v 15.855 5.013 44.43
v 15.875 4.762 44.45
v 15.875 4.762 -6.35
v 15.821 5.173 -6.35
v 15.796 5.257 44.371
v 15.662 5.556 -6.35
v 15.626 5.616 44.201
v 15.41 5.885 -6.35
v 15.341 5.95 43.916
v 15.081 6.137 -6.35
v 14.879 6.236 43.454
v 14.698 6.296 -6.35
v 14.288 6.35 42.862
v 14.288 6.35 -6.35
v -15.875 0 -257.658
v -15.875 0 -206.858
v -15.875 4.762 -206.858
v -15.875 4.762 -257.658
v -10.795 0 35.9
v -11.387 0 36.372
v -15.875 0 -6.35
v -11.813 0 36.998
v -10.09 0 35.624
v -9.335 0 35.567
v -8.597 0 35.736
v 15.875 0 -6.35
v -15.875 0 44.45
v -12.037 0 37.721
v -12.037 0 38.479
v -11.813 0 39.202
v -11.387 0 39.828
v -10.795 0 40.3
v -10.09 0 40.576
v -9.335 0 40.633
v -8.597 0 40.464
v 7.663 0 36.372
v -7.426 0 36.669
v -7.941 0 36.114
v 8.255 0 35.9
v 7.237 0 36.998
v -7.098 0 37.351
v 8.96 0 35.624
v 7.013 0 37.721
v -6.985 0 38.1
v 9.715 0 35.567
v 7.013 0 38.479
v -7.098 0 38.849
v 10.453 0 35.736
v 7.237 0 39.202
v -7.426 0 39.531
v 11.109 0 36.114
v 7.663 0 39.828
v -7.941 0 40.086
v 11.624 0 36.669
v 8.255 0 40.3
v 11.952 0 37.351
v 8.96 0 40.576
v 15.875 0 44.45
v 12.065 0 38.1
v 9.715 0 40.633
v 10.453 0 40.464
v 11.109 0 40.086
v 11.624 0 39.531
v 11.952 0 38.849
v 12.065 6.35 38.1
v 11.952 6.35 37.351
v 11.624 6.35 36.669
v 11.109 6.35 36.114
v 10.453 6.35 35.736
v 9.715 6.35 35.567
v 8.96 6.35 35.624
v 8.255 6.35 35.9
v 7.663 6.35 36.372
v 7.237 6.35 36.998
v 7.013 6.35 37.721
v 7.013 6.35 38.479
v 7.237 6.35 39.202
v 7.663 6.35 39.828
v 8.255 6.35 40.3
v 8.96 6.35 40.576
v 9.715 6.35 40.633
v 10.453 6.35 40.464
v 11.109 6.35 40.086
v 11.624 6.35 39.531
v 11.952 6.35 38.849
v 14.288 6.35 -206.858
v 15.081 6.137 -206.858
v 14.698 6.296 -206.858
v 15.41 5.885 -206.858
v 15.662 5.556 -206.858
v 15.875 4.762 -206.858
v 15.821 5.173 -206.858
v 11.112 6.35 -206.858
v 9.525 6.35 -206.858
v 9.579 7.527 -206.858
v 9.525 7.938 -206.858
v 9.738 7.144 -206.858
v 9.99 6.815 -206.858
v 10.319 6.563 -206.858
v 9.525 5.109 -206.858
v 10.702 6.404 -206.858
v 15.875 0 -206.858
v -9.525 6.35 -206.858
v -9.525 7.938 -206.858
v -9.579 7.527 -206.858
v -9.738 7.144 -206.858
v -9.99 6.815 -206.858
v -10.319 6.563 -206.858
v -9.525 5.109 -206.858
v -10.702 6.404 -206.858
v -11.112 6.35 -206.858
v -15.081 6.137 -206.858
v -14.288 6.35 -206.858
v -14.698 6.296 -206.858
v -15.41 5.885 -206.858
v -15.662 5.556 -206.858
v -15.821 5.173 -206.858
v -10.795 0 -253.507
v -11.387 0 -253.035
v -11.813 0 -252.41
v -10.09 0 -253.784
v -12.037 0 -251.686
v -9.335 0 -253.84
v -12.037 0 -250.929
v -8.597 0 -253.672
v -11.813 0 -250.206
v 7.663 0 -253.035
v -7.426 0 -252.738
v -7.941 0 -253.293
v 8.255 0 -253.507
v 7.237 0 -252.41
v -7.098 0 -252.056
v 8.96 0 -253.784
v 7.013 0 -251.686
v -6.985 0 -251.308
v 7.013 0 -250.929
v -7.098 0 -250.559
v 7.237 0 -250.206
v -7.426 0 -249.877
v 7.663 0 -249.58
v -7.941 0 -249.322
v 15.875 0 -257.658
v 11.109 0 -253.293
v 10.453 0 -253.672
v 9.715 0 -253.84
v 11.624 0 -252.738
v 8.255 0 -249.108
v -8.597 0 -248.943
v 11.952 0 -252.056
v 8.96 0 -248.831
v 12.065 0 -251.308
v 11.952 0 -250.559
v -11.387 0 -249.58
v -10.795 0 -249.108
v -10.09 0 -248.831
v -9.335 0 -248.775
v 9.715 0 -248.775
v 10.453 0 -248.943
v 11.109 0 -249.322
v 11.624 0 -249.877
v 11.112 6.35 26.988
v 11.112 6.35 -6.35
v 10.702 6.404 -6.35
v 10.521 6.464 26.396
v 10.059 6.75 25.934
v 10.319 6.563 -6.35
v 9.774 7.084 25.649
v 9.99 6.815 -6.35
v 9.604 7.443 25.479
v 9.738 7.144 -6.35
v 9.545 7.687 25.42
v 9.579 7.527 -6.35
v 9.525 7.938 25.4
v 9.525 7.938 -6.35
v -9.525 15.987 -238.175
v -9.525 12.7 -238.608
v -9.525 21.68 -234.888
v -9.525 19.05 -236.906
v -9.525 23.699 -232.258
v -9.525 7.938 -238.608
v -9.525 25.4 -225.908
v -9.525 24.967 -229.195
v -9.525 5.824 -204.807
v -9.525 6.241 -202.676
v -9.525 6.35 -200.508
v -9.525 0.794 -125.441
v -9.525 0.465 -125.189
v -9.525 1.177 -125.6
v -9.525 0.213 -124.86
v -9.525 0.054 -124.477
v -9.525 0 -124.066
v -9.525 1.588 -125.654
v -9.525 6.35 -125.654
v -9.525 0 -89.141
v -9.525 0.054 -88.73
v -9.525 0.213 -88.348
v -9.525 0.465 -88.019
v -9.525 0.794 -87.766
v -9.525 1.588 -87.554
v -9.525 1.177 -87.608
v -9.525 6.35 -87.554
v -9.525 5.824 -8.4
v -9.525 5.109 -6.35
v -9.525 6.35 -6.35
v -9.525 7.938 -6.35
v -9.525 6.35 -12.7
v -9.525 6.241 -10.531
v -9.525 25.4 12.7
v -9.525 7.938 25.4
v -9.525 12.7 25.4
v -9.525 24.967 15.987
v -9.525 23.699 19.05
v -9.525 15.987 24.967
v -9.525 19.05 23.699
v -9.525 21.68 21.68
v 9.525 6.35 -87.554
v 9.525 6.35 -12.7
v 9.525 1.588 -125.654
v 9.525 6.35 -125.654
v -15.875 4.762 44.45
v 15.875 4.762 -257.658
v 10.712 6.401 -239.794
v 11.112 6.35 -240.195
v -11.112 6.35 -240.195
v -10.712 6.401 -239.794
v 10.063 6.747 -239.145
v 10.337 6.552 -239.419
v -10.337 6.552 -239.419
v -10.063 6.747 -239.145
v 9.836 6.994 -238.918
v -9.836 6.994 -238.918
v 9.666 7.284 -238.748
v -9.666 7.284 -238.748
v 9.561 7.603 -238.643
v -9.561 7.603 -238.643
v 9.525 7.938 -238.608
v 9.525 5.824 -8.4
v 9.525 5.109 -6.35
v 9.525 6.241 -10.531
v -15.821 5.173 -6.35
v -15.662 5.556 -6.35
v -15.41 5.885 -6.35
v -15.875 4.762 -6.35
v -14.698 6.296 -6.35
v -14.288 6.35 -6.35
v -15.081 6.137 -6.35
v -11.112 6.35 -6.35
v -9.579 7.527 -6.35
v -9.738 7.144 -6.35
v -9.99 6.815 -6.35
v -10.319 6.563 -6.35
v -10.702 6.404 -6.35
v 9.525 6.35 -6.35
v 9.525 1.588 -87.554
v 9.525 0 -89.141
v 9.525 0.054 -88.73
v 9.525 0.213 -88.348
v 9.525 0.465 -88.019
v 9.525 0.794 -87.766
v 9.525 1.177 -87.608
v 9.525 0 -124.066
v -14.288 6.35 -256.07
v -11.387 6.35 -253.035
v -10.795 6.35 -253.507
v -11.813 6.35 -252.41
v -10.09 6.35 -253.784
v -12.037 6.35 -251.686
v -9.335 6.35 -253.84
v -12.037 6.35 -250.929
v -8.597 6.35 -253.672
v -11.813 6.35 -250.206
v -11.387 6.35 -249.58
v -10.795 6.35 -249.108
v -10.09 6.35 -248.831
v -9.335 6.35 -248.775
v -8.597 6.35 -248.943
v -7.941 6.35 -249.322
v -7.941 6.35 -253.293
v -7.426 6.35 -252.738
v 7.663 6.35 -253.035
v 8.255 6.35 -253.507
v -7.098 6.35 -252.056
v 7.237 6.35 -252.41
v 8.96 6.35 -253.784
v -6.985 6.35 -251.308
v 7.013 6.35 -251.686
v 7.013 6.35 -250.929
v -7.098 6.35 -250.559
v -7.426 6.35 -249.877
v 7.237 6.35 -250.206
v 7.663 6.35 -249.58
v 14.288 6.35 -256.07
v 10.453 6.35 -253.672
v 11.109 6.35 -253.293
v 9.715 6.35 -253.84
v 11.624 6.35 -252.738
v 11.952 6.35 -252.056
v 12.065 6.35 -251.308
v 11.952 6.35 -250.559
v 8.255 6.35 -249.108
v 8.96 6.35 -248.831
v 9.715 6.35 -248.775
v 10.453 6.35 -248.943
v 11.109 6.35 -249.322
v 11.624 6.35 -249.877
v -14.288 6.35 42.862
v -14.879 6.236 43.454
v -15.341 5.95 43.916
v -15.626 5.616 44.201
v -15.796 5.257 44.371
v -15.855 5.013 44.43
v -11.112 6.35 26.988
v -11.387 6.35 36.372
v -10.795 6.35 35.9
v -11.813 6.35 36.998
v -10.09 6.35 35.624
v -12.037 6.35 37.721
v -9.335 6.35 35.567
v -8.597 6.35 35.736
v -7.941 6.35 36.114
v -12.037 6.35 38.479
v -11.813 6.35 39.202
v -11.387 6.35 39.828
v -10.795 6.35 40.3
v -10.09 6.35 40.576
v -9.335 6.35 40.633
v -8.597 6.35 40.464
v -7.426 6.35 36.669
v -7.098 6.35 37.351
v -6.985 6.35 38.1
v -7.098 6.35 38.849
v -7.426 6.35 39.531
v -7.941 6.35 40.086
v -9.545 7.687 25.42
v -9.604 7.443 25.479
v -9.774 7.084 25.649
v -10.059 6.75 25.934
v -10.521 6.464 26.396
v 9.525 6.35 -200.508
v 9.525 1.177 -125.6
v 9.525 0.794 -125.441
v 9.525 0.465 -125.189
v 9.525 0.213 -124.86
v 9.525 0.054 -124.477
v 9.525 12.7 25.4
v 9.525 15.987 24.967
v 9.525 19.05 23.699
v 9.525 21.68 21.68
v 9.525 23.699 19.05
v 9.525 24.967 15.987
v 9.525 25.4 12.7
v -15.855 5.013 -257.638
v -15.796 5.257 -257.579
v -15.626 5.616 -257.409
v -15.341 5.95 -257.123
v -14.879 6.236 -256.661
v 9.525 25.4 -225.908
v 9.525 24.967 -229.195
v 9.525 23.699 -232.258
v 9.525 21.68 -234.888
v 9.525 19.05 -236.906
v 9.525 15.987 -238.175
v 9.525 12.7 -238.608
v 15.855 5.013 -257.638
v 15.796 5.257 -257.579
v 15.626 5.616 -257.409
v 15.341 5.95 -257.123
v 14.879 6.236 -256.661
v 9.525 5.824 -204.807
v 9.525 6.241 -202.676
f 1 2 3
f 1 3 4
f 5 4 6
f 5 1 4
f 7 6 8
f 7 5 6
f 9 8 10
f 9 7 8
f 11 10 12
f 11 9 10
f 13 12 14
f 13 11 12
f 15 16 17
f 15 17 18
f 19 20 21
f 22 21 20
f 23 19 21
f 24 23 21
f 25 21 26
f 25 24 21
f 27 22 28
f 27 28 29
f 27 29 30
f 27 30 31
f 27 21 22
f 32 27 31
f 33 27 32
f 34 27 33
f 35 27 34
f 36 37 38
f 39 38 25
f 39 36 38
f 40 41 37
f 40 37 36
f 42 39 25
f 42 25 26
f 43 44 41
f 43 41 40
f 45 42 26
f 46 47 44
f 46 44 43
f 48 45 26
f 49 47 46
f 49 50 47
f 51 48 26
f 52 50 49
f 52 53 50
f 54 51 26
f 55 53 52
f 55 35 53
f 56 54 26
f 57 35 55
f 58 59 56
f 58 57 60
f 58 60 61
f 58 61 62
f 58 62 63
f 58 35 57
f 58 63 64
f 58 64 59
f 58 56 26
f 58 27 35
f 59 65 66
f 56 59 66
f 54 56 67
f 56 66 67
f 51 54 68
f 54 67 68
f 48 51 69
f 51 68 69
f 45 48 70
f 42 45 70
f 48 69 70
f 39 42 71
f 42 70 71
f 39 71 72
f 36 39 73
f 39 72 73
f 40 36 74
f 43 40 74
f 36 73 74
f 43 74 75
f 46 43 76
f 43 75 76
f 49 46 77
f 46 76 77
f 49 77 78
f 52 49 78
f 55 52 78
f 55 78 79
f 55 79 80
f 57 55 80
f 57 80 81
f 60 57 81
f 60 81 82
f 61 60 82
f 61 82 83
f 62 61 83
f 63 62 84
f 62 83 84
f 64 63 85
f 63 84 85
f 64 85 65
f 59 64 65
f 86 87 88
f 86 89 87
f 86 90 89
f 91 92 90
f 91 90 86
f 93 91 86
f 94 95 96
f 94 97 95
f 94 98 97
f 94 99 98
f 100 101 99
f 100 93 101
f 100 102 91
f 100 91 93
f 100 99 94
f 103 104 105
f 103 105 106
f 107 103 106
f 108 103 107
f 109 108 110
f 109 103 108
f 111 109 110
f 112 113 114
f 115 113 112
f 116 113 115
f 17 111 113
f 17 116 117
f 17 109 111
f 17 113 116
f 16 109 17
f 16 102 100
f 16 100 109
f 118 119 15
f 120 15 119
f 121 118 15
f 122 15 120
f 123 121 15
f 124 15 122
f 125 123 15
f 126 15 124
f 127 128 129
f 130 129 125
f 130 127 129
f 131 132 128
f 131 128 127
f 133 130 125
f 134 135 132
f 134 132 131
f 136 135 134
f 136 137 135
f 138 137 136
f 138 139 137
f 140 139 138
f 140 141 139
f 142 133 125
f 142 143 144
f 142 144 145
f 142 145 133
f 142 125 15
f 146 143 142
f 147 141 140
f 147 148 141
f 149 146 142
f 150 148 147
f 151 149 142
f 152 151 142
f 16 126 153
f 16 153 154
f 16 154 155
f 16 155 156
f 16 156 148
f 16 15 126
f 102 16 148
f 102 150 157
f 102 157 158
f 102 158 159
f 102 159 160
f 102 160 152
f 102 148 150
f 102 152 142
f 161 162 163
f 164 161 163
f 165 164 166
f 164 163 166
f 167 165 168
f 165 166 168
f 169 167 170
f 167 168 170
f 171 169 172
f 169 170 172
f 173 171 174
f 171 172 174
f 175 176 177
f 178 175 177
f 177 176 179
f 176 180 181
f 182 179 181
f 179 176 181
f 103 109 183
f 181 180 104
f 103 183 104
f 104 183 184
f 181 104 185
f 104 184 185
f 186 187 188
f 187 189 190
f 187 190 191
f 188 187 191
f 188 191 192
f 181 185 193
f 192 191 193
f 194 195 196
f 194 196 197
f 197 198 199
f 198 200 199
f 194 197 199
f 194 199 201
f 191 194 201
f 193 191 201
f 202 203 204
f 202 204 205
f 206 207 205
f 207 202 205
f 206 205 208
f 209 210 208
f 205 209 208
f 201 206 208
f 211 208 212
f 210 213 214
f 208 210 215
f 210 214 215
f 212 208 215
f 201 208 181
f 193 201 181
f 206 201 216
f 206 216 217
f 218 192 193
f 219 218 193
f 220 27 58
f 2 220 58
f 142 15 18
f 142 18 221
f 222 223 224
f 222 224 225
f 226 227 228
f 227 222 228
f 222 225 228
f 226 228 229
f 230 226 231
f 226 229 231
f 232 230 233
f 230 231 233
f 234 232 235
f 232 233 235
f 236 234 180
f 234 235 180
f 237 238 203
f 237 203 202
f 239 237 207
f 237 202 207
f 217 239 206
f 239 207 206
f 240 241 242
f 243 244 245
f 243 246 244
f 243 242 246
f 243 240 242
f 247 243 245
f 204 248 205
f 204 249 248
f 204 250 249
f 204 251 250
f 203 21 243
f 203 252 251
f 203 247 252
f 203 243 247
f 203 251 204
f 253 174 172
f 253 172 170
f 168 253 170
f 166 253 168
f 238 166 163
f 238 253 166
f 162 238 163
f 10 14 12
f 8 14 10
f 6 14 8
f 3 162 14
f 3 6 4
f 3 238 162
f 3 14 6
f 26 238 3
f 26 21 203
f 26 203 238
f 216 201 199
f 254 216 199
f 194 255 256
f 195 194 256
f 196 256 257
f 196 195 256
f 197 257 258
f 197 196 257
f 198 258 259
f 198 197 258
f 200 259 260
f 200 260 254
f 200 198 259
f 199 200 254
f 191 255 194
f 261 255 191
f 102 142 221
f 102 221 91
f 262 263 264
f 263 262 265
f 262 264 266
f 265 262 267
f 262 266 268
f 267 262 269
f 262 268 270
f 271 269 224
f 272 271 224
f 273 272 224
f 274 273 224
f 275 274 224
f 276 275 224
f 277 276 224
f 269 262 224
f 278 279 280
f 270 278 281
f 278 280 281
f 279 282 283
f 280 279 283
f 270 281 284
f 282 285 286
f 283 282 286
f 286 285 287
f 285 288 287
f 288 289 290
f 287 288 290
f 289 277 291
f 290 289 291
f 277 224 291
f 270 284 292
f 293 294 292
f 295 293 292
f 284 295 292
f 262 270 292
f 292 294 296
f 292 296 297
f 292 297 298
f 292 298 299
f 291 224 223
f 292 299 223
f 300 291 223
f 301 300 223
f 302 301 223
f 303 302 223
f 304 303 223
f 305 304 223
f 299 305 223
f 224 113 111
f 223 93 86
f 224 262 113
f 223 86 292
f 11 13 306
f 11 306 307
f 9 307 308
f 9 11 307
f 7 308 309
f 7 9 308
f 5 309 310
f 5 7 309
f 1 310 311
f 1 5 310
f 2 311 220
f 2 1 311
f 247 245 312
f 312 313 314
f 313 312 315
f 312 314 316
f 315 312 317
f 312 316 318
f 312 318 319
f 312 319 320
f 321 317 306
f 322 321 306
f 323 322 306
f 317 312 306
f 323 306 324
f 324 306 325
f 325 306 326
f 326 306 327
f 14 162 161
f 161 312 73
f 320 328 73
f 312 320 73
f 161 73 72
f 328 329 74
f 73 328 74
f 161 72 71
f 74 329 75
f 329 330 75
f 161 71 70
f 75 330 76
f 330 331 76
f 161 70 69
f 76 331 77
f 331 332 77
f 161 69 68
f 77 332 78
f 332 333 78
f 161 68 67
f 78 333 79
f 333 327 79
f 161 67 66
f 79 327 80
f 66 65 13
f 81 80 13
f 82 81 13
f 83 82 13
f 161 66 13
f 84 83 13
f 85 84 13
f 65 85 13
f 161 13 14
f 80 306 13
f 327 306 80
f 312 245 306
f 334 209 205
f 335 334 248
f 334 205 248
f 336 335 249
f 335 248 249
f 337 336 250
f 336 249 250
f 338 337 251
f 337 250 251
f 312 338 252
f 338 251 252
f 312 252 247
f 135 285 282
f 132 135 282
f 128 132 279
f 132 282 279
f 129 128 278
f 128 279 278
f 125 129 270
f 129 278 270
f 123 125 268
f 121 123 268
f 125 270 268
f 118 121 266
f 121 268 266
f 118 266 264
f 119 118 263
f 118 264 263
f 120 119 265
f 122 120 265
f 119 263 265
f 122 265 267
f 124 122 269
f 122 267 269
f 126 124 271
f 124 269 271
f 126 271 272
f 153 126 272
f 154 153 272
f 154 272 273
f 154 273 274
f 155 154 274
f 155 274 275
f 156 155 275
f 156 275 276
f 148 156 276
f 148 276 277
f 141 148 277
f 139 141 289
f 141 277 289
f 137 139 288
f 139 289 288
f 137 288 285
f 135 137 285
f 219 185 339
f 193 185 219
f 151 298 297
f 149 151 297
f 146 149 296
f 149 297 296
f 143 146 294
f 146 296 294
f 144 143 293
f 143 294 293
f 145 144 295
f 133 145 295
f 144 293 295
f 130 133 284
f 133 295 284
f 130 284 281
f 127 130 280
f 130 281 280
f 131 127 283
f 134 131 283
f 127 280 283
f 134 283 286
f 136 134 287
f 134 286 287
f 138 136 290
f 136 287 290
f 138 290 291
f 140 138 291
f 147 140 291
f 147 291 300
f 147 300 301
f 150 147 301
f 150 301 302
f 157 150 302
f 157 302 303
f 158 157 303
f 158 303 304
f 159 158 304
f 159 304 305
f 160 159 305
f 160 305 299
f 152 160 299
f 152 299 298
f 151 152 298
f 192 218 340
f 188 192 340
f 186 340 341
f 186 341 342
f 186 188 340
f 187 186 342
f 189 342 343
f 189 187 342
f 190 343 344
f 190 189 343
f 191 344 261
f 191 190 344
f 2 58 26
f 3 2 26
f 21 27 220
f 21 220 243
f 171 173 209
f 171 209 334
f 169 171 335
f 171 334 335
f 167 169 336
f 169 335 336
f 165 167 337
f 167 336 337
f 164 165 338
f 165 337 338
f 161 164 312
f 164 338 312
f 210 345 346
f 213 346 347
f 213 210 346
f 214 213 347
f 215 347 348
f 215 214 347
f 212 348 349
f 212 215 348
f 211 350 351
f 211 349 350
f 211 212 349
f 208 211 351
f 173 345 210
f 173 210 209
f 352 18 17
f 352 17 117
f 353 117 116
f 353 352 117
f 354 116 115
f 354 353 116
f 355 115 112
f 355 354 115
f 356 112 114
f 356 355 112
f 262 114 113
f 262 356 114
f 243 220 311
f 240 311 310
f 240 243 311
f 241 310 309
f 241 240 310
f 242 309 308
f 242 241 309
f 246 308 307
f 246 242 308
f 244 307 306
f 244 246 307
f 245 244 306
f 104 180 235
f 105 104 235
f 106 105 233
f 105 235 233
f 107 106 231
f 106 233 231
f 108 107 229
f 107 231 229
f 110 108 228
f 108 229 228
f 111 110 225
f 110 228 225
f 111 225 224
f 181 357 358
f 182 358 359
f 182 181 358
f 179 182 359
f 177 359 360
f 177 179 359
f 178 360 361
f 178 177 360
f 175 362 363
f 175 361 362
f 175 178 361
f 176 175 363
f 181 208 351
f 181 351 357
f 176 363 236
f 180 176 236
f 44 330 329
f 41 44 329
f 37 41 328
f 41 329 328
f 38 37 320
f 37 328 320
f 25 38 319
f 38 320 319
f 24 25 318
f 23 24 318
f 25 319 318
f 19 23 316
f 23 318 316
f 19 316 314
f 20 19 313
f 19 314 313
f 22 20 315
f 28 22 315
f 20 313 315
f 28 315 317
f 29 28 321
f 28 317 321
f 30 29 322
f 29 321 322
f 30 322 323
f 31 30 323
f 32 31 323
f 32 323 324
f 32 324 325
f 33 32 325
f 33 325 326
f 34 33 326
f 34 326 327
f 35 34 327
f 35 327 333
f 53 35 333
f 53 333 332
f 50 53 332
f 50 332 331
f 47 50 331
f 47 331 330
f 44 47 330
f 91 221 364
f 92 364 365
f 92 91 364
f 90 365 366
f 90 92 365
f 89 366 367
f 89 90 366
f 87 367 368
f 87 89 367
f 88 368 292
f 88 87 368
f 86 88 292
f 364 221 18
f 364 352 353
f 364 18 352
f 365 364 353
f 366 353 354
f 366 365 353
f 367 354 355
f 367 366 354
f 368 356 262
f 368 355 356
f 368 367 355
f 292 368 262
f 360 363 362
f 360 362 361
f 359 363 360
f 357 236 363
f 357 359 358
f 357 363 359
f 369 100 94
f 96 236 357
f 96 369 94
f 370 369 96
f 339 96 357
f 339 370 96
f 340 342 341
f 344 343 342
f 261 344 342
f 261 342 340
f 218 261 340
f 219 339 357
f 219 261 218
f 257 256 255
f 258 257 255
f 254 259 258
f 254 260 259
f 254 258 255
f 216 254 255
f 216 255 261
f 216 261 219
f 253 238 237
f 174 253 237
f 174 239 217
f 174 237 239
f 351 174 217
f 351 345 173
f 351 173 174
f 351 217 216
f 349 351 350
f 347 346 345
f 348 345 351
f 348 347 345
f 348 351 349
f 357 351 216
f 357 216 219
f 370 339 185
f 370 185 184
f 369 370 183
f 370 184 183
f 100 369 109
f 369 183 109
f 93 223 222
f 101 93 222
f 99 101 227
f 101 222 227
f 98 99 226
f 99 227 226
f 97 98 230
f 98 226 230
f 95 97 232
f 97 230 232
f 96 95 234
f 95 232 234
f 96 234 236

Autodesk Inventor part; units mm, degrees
ref_plane "YZ Plane" through (0, 0, 0) normal (1, 0, 0) x (0, 1, 0)
ref_plane "XZ Plane" through (0, 0, 0) normal (0, 1, 0) x (-1, 0, 0)
ref_plane "XY Plane" through (0, 0, 0) normal (0, 0, 1) x (1, 0, 0)
sketch "Sketch1" plane through (0, 0, 0) normal (1, 0, 0) x (0, 1, 0)
  line L0 (0, 0) -> (0, 0)
  line L1 (25.4, 0) -> (25.4, 12.7)
  line L2 (12.7, 25.4) -> (0, 25.4)
  line L3 (0, 25.4) -> (0, 0)
  line L4 (12.7, -238.6076) -> (0, -238.6076)
  line L5 (0, -238.6076) -> (0, -213.2076)
  line L6 (0, -213.2076) -> (0, -213.2076)
  line L7 (25.4, -213.2076) -> (25.4, -225.9076)
  arc A0 (25.4, 12.7) -> (12.7, 25.4) centre (12.7, 12.7) ccw
  arc A1 (12.7, -238.6076) -> (25.4, -225.9076) centre (12.7, -225.9076) ccw
  arc A2 (6.35, -12.7) -> (0, 0) centre (-8.8867, -12.3808) ccw
  arc A3 (0, -213.2076) -> (6.35, -200.5076) centre (-8.8867, -200.8268) ccw
  line L8 (25.4, 0) -> (25.4, -213.2076)
  line L9 (6.35, -200.5076) -> (6.35, -12.7)
  point P0 (0, -213.2076)
  point P1 (0, -213.2076)
  dimension "d5" = 25.4
  dimension "d6" = 12.7
  dimension "d9" = 264.0076
  dimension "d10" = 25.4
  dimension "d12" = 25.4
  dimension "d15" = 15.24
  dimension "d16" = 15.24
extrude "Extrusion1" add sketch "Sketch1" along normal mid plane 19.05
sketch "Sketch2" plane through (-9.525, 0, 0) normal (0, -1, 0) x (1, 0, 0)
  line L0 (0, 0) -> (19.05, 0) projected
  line L1 (19.05, 12.7) -> (19.05, 25.4) projected
  line L2 (0, 0) -> (19.05, 0)
  line L3 (19.05, 0) -> (19.05, 25.4)
  line L4 (19.05, 25.4) -> (0, 25.4)
  line L5 (0, 25.4) -> (0, 0)
  line L6 (0, -213.2076) -> (19.05, -213.2076) projected
  line L7 (0, -238.6076) -> (19.05, -238.6076) projected
  line L8 (19.05, -213.2076) -> (0, -213.2076)
  line L9 (0, -213.2076) -> (0, -238.6076)
  line L10 (0, -238.6076) -> (19.05, -238.6076)
  line L11 (19.05, -238.6076) -> (19.05, -213.2076)
  line L12 (25.4, -206.8576) -> (-6.35, -206.8576)
  line L13 (-6.35, -206.8576) -> (-6.35, -244.9576)
  line L14 (25.4, -244.9576) -> (25.4, -206.8576)
  line L15 (-6.35, -6.35) -> (25.4, -6.35)
  line L16 (25.4, -6.35) -> (25.4, 31.75)
  line L17 (-6.35, 31.75) -> (-6.35, -6.35)
  line L18 (-6.35, 44.45) -> (25.4, 44.45)
  line L19 (25.4, 44.45) -> (25.4, 31.75)
  line L20 (-6.35, 31.75) -> (-6.35, 44.45)
  line L21 (-6.35, -244.9576) -> (-6.35, -257.6576)
  line L22 (-6.35, -257.6576) -> (25.4, -257.6576)
  line L23 (25.4, -257.6576) -> (25.4, -244.9576)
  point P0 (9.525, 0)
  dimension "d17" = 31.75
  dimension "d18" = 38.1
  dimension "d19" = 31.75
  dimension "d20" = 38.1
  dimension "d23" = 12.7
extrude "Extrusion2" add sketch "Sketch2" against normal blind 6.35 contours L5 L4 L1 L3 L0 | L6 L11 L7 L9 | L14 L23 L22 L21 L13 L12 | L17 L20 L18 L19 L16 L15
sketch "Sketch3" plane through (-9.525, 6.35, 0) normal (0, 1, 0) x (1, 0, 0)
  circle A0 centre (0, 251.3076) radius 2.54
  circle A1 centre (19.05, 251.3076) radius 2.54
  line L0 (25.4, 206.8576) -> (25.4, 257.6576) projected
  line L1 (25.4, 257.6576) -> (-6.35, 257.6576) projected
  line L2 (-6.35, 257.6576) -> (-6.35, 206.8576) projected
  circle A2 centre (0, -38.1) radius 2.54
  circle A3 centre (19.05, -38.1) radius 2.54
  line L3 (-6.35, 6.35) -> (-6.35, -44.45) projected
  line L4 (-6.35, -44.45) -> (25.4, -44.45) projected
  line L5 (25.4, -44.45) -> (25.4, 6.35) projected
  point P0 (9.525, 0)
  dimension "d24" = 5.08
  dimension "d25" = 5.08
  dimension "d26" = 6.35
  dimension "d27" = 6.35
  dimension "d28" = 6.35
  dimension "d29" = 6.35
  dimension "d30" = 5.08
  dimension "d31" = 5.08
  dimension "d32" = 6.35
  dimension "d33" = 6.35
  dimension "d34" = 6.35
  dimension "d35" = 6.35
extrude "Extrusion3" cut sketch "Sketch3" against normal through all
sketch "Sketch4" plane through (9.525, 0, 0) normal (1, 0, 0) x (0, 0, -1)
  line L0 (200.5076, 6.35) -> (12.7, 6.35) projected
  line L1 (87.5538, 0) -> (125.6538, 0)
  line L2 (125.6538, 0) -> (125.6538, 6.35)
  line L3 (125.6538, 6.35) -> (87.5538, 6.35)
  line L4 (87.5538, 6.35) -> (87.5538, 0)
  line L5 (87.5538, 0) -> (125.6538, 6.35) construction
  line L6 (125.6538, 0) -> (87.5538, 6.35) construction
  point P0 (0, 0)
  point P1 (106.6038, 6.35)
  point P2 (106.6038, 3.175)
  dimension "d38" = 38.1
extrude "Extrusion4" add sketch "Sketch4" against normal blind 19.05
fillet "Fillet1" radius 1.5875 14 edges at (15.875, 6.35, 19.05) (0, 6.35, 25.4) (9.525, 6.35, 9.525) (0, 6.35, 44.45) (-15.875, 6.35, 19.05) (-9.525, 6.35, 9.525) (0, 0, -125.6538) (0, 0, -87.5538) (9.525, 6.35, -222.7326) (15.875, 6.35, -232.2576) (0, 6.35, -238.6076) (0, 6.35, -257.6576) (-9.525, 6.35, -222.7326) (-15.875, 6.35, -232.2576)
properties part number "IndexRailM" material "Polycarbonate, Clear"
